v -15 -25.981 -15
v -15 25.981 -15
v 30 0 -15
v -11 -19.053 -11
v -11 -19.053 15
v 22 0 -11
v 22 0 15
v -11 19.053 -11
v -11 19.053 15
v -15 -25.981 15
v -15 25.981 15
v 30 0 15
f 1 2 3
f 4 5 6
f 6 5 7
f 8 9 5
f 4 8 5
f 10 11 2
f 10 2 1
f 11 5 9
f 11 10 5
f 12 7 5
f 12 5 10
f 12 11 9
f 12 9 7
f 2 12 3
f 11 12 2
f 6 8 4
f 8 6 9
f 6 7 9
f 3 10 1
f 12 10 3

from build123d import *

# Parameters (mm, degrees)
EXTRUDE_1_DEPTH = 15
SHELL_1_T       = -4


with BuildPart() as part:
    # 草图1 → 凸台-拉伸1 (new, symmetric)
    with BuildSketch(Plane.XY):
        Polygon((30, 0), (-15, 25.980762114), (-15, -25.980762114), align=None)
    extrude(amount=EXTRUDE_1_DEPTH, both=True)

    # 抽壳1
    shell_1_openings = [part.faces().sort_by_distance(p)[0] for p in [
        (0, 0, 15),
    ]]
    offset(amount=SHELL_1_T, openings=shell_1_openings, kind=Kind.INTERSECTION)


solid = part.part
